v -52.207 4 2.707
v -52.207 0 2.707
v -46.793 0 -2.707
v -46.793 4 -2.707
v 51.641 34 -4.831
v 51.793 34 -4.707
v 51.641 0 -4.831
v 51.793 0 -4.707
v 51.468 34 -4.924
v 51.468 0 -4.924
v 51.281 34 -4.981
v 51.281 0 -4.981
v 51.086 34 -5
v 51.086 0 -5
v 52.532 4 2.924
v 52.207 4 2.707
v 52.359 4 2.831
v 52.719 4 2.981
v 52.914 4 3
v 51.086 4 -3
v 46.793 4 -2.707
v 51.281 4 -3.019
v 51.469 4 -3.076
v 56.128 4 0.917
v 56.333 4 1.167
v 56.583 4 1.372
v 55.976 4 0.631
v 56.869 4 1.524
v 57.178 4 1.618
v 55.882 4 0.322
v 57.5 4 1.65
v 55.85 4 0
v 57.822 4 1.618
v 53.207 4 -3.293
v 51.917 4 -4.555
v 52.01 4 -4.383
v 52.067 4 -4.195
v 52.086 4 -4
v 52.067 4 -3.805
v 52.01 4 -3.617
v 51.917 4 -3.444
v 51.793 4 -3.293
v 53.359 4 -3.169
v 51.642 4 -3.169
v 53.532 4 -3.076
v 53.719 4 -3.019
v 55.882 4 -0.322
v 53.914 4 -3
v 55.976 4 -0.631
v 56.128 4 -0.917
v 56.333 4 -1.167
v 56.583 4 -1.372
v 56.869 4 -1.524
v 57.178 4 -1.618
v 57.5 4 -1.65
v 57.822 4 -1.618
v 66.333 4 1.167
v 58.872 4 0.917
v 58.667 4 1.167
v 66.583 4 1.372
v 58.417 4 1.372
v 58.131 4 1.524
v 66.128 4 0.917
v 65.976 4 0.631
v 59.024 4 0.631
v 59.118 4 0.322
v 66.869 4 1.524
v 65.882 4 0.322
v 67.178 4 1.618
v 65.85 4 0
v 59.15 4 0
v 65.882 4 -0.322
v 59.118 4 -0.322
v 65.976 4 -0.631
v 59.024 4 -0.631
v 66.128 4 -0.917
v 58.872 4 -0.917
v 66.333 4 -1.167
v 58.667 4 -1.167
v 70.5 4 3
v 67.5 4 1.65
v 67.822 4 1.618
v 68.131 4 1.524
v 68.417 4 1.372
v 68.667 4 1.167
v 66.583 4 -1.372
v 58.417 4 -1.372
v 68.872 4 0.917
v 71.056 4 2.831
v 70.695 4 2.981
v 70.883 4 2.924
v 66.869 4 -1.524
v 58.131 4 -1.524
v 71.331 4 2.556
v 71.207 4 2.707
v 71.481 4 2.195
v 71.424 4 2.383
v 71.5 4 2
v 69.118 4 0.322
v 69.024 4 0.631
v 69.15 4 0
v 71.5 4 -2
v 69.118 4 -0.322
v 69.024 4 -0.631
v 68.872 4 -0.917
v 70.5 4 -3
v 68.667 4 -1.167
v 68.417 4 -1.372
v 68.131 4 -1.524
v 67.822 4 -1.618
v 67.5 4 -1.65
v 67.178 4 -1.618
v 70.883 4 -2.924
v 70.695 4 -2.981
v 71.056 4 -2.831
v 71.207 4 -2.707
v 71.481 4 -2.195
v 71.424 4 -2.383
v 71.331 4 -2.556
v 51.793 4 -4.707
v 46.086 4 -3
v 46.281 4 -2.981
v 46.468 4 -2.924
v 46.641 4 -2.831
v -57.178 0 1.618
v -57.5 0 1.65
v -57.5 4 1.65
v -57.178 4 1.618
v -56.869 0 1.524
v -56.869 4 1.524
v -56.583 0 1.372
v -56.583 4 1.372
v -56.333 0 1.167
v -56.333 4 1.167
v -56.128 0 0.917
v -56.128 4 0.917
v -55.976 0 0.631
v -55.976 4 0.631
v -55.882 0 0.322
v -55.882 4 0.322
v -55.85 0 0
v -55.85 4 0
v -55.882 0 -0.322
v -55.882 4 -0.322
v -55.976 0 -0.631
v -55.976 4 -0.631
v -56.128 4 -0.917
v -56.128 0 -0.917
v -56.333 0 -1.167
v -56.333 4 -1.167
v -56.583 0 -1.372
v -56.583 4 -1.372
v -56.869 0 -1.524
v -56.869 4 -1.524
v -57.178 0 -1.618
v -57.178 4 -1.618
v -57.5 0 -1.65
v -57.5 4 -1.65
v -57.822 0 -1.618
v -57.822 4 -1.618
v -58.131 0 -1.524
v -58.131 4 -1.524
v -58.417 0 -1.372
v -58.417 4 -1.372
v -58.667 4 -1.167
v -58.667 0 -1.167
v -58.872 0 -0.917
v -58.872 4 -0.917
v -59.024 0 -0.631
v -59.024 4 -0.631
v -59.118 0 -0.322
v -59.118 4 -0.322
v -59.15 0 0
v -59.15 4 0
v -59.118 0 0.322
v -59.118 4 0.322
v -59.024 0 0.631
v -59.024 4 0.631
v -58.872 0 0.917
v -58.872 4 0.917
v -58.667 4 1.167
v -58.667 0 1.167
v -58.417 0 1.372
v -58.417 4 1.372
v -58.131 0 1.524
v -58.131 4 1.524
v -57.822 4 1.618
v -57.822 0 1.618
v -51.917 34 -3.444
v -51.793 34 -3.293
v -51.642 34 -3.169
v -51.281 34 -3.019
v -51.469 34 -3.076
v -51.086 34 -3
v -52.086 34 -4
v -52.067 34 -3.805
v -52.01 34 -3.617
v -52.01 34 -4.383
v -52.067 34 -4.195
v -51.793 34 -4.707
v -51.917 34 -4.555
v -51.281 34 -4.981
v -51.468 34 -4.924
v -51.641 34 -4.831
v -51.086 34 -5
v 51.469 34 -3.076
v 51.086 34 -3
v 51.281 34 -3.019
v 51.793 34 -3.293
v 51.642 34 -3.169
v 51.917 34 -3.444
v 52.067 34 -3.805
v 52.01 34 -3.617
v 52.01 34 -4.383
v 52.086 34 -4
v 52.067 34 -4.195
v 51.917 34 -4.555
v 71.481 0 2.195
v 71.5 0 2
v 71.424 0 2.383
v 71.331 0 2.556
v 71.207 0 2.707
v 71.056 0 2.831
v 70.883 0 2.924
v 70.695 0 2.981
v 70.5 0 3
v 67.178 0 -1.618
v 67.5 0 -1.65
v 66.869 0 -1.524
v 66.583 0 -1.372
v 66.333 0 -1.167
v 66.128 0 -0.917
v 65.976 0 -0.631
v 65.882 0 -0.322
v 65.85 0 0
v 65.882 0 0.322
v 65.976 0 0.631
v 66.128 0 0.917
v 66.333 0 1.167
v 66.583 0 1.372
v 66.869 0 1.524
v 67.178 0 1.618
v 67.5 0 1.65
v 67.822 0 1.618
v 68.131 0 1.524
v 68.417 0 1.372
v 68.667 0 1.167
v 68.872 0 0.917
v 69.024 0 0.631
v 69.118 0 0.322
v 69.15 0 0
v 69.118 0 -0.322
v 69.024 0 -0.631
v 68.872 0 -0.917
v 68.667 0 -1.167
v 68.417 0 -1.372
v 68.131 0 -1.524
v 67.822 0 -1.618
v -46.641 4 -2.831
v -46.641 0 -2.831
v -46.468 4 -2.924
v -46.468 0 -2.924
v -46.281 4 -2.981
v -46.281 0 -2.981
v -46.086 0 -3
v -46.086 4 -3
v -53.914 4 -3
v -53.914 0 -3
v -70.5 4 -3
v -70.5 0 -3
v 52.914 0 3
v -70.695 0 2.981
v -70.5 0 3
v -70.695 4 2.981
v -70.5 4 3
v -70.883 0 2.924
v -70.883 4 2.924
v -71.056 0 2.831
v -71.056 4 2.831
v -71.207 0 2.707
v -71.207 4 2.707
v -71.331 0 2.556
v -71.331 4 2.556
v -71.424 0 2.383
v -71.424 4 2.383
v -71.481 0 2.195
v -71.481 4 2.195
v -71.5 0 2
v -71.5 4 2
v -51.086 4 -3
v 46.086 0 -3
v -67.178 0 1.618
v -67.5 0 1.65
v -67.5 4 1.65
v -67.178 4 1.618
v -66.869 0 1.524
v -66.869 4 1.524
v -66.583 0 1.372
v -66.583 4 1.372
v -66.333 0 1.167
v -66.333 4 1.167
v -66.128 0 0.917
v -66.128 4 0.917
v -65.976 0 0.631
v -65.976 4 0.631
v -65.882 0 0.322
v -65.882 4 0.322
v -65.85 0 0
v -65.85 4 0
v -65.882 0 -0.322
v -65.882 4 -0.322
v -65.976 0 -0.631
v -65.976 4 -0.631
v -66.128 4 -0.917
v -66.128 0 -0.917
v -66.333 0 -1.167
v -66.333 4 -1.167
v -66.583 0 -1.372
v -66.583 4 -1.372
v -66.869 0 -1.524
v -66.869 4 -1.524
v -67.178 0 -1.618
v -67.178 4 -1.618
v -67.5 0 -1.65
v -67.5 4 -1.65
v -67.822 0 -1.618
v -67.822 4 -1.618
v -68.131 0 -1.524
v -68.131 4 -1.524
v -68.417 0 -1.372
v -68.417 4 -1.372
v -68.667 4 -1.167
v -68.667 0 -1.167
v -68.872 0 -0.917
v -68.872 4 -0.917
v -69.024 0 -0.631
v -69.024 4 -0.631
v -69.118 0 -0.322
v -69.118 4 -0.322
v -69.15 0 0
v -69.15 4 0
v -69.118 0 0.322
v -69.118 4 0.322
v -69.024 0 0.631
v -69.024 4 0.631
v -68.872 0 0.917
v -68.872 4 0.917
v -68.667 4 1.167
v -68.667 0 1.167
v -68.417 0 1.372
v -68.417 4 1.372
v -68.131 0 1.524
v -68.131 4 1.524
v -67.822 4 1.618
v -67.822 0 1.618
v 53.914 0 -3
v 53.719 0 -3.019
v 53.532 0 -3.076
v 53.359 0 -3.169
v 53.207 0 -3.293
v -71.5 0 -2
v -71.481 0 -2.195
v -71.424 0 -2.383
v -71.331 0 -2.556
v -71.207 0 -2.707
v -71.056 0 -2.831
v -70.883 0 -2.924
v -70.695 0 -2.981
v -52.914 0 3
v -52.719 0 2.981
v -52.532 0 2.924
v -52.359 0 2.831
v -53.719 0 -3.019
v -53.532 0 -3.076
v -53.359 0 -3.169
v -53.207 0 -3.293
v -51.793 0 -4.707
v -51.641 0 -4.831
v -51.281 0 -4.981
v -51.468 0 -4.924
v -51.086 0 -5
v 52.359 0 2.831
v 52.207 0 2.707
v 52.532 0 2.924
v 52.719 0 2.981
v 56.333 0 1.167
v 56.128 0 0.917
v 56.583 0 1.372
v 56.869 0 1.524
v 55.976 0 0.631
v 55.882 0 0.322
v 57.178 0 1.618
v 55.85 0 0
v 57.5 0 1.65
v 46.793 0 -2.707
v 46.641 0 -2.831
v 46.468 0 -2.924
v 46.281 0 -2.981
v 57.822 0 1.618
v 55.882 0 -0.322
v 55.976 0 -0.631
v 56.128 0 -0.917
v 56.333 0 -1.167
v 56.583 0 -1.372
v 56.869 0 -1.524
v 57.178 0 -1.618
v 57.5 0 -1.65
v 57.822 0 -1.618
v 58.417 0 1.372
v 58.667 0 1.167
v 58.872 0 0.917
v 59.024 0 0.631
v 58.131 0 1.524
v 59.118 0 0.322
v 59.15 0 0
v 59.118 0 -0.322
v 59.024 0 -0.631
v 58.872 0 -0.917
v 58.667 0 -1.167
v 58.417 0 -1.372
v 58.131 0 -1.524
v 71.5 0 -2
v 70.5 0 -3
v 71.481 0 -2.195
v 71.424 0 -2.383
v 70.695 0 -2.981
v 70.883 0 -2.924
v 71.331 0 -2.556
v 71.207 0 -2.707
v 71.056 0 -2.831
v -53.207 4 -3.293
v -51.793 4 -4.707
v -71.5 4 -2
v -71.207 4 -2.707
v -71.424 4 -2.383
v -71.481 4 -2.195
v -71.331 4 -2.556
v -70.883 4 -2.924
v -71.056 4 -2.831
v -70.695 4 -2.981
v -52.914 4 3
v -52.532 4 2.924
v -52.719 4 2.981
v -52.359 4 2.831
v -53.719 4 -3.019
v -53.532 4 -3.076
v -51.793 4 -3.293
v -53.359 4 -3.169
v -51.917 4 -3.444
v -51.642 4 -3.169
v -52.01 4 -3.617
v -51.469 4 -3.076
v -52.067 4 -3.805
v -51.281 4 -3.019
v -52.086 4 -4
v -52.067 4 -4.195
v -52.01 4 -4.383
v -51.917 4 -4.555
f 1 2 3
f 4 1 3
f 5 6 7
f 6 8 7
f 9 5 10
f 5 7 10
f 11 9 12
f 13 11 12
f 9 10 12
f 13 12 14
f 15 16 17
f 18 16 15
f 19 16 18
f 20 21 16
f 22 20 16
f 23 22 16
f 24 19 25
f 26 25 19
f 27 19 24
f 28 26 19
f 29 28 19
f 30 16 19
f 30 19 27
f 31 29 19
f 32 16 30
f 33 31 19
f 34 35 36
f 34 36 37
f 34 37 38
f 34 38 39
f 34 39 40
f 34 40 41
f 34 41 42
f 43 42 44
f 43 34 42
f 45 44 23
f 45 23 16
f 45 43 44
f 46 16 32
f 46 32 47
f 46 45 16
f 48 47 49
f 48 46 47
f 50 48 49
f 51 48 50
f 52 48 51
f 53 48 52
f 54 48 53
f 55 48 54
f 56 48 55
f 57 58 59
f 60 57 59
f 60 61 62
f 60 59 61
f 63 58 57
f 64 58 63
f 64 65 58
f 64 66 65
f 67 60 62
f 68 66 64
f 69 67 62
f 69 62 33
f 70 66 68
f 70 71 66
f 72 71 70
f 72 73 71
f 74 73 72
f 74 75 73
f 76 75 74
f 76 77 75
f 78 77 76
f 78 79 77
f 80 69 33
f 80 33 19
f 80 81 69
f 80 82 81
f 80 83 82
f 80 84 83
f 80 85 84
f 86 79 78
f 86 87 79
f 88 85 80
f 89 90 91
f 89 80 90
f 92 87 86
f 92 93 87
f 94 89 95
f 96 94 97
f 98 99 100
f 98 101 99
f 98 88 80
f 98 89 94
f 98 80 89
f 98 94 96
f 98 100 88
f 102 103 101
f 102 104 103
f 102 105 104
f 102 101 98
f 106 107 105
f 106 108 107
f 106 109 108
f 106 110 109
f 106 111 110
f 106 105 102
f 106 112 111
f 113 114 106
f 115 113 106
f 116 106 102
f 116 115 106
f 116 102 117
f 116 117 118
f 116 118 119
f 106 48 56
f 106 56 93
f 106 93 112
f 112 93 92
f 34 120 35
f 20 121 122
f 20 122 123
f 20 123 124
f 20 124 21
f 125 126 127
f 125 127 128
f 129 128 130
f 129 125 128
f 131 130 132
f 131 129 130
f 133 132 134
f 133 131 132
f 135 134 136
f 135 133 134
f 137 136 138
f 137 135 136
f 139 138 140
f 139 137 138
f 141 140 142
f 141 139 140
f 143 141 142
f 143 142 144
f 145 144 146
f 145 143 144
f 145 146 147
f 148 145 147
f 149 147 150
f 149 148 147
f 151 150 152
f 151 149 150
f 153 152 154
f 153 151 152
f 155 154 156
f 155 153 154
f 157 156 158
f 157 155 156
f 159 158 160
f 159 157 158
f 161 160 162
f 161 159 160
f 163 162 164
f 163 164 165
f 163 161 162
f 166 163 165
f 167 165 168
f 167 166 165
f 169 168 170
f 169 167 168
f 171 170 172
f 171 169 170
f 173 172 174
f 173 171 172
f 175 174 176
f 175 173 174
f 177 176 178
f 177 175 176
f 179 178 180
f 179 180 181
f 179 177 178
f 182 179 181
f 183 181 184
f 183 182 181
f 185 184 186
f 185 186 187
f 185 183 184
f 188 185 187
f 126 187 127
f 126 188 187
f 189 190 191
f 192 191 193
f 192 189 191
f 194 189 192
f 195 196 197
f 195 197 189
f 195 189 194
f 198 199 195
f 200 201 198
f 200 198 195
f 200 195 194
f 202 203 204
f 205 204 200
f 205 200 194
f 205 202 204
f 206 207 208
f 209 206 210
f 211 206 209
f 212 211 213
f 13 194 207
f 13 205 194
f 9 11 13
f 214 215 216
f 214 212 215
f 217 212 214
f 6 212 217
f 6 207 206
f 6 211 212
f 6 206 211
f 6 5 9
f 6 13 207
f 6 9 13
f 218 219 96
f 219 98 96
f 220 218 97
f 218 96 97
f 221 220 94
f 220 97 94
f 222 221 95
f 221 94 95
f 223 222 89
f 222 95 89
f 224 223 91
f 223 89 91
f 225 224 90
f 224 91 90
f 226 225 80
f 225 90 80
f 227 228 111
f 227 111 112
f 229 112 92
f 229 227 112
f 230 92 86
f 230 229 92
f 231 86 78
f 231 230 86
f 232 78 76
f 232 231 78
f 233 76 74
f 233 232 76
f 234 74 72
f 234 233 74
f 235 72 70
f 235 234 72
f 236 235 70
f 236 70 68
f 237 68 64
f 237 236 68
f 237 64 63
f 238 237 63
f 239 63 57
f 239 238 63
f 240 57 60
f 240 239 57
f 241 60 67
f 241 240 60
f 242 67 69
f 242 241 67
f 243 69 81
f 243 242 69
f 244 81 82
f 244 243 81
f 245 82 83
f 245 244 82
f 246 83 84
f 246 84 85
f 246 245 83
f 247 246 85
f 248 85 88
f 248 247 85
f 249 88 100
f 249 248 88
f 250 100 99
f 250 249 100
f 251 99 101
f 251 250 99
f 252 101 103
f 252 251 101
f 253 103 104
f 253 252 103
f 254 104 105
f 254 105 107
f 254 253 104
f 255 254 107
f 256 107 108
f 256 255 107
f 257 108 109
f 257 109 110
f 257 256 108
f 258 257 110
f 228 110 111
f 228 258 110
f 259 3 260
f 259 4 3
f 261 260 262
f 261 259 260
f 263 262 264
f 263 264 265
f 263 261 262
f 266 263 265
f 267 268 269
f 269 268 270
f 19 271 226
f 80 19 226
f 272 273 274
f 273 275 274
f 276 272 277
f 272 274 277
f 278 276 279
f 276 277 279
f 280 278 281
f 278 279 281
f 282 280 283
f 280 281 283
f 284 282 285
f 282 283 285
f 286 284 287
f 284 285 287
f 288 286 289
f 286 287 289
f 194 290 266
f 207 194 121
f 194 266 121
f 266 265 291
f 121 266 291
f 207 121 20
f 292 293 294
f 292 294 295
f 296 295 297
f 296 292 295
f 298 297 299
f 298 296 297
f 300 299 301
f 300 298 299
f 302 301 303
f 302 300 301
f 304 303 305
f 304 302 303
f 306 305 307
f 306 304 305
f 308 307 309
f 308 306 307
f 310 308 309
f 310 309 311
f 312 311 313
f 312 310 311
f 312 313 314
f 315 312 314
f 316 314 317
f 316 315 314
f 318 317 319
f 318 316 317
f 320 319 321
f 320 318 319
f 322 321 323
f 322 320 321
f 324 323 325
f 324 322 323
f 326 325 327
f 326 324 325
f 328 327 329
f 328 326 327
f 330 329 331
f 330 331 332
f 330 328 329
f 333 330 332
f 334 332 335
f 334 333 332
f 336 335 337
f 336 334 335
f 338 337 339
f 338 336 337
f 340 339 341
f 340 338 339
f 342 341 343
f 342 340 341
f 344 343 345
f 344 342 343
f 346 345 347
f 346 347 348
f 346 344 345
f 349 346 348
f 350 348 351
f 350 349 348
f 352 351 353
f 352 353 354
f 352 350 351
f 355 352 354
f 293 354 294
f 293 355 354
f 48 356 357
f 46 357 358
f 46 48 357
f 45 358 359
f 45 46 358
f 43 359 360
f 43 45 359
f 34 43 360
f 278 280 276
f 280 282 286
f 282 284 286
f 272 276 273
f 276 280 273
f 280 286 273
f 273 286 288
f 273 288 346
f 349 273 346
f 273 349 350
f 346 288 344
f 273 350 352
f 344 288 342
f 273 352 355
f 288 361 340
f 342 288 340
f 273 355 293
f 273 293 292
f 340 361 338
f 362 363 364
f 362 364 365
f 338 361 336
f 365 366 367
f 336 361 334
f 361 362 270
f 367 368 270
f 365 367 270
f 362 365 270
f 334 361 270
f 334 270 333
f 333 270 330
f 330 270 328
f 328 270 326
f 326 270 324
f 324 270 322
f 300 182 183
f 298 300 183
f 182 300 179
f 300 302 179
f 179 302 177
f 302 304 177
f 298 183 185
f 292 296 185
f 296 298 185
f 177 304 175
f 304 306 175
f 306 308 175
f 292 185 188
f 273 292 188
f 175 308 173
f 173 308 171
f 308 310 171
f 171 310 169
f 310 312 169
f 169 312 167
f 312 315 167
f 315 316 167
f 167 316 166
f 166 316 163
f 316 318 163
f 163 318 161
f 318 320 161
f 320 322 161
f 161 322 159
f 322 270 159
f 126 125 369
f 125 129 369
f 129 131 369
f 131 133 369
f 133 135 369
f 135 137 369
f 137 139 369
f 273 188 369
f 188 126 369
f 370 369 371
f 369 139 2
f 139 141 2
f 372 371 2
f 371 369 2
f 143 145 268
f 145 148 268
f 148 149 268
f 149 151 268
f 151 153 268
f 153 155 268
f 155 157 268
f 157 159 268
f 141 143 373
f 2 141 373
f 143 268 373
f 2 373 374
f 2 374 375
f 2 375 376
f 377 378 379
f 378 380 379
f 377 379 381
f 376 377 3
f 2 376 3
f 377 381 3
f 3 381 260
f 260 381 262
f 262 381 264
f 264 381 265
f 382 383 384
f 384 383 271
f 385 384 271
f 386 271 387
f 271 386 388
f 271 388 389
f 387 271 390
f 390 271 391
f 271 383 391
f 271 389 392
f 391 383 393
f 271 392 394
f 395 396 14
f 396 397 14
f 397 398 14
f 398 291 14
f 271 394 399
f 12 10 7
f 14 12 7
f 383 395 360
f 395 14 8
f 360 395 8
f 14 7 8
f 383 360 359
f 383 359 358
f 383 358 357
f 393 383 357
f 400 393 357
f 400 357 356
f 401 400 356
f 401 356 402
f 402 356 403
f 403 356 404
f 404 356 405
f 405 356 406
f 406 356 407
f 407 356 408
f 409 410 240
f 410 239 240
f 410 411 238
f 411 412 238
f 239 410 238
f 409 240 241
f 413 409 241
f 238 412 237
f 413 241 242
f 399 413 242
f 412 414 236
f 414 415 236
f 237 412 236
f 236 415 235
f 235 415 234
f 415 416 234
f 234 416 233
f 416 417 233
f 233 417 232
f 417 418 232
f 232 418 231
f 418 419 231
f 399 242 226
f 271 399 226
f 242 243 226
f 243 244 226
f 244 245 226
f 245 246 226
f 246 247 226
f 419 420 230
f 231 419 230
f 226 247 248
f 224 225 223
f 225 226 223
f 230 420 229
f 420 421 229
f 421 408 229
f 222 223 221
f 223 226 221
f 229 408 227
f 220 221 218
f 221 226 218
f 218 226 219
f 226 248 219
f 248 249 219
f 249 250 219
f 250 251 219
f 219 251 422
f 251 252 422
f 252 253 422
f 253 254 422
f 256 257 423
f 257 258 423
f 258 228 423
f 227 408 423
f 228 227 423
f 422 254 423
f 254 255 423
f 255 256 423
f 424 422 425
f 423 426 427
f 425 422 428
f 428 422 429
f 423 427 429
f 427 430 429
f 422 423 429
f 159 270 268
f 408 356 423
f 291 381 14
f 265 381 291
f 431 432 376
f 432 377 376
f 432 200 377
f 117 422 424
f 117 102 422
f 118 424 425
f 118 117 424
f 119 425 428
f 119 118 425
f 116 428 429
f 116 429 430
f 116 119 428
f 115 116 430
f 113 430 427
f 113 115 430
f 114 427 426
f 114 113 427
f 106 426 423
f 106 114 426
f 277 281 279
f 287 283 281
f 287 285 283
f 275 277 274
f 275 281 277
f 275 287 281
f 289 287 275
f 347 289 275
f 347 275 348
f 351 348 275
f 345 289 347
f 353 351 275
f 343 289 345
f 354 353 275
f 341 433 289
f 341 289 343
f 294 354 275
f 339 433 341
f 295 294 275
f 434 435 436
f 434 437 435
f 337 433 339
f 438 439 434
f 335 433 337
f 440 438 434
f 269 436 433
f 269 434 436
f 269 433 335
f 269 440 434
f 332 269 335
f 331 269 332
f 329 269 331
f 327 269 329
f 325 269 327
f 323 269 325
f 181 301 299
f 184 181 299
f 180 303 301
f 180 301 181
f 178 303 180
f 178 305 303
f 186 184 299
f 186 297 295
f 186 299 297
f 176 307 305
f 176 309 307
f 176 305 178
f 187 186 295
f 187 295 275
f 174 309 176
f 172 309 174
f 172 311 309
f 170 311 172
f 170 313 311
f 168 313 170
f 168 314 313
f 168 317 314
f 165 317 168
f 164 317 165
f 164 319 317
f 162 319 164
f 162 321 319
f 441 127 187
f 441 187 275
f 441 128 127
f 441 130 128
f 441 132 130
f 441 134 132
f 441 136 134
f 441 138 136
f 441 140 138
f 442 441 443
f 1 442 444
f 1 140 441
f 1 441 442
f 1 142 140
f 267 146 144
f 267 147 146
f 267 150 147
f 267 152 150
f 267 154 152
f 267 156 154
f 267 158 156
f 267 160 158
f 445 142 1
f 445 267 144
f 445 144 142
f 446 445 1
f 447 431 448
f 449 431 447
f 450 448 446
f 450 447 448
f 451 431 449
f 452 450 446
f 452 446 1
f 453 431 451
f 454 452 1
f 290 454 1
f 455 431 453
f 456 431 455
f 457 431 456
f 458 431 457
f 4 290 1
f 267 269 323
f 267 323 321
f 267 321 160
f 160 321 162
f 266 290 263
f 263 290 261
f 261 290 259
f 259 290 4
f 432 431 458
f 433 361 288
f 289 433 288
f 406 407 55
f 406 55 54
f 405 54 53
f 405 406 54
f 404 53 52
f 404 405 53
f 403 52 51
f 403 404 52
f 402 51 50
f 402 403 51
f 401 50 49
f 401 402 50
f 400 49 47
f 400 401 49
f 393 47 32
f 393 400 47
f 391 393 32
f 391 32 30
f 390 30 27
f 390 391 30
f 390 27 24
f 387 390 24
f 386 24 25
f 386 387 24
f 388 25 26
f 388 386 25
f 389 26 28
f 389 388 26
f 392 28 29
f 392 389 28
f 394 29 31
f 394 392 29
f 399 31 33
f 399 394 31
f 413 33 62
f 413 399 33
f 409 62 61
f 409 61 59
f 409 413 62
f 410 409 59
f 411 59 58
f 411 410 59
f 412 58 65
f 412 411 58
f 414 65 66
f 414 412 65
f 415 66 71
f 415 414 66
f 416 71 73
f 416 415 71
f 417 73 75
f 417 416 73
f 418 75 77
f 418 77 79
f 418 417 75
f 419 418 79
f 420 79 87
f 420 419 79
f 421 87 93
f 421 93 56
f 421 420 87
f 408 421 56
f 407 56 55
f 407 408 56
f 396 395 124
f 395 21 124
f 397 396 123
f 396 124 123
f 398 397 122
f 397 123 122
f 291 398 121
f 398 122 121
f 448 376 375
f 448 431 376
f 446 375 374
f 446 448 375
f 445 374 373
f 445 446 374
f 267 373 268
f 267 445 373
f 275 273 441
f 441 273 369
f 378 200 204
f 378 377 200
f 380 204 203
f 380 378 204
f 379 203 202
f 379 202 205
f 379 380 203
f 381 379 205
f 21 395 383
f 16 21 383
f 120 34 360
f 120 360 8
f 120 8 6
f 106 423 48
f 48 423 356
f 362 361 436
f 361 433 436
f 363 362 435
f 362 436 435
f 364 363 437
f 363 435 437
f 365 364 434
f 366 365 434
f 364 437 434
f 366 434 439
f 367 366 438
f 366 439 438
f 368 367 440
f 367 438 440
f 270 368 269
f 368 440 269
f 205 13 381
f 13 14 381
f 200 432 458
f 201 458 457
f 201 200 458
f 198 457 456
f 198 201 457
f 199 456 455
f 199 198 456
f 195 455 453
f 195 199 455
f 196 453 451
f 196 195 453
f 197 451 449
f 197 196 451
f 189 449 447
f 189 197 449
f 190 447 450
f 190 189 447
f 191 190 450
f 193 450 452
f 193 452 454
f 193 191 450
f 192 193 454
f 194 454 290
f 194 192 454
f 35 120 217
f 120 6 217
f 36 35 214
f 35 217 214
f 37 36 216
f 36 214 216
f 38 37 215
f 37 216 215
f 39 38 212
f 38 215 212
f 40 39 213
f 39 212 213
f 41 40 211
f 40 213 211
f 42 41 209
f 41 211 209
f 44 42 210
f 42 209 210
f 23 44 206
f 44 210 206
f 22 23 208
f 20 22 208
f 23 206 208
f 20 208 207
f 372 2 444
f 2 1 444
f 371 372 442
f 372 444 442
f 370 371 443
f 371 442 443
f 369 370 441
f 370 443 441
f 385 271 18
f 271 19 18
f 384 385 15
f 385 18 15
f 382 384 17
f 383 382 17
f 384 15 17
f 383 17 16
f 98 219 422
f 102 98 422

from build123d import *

# Parameters (mm, degrees)
SKETCH_1_R      = 1.65
EXTRUDE_1_DEPTH = 4
EXTRUDE_2_DEPTH = 30
FILLET_1_R      = 1
FILLET_2_R      = 1


with BuildPart() as part:
    # 草图1 → 凸台-拉伸1 (new body)
    with BuildSketch(Plane(origin=(0, 0, 0), x_dir=(1, 0, 0), z_dir=(0, 1, 0))):
        Polygon((-71.5, 3), (-71.5, -3), (-52.5, -3), (-46.5, 3), (46.5, 3), (52.5, -3), (71.5, -3), (71.5, 3), (53.5, 3), (51.5, 5), (-51.5, 5), (-53.5, 3), align=None)
        with Locations(Location((-57.5, 0, 0), (0, 0, 270))):
            Circle(SKETCH_1_R, mode=Mode.SUBTRACT)
        with Locations(Location((-67.5, 0, 0), (0, 0, 270))):
            Circle(SKETCH_1_R, mode=Mode.SUBTRACT)
        with Locations(Location((67.5, 0, 0), (0, 0, 90))):
            Circle(SKETCH_1_R, mode=Mode.SUBTRACT)
        with Locations(Location((57.5, 0, 0), (0, 0, 90))):
            Circle(SKETCH_1_R, mode=Mode.SUBTRACT)
    extrude(amount=EXTRUDE_1_DEPTH)

    # 草图2 → 凸台-拉伸2 (add)
    with BuildSketch(Plane(origin=(0, 4, 0), x_dir=(1, 0, 0), z_dir=(0, 1, 0))):
        Polygon((-51.5, 5), (-53.5, 3), (53.5, 3), (51.5, 5), align=None)
    extrude(amount=EXTRUDE_2_DEPTH)

    # 圆角1
    fillet_1_edges = [part.edges().sort_by_distance(p)[0] for p in [
        (51.5, 17, -5),
        (-51.5, 17, -5),
        (-71.5, 2, -3),
        (-71.5, 2, 3),
        (-46.5, 2, -3),
        (46.5, 2, -3),
        (52.5, 2, 3),
        (71.5, 2, 3),
        (71.5, 2, -3),
        (-52.5, 2, 3),
        (-53.5, 19, -3),
        (53.5, 19, -3),
    ]]
    fillet(fillet_1_edges, radius=FILLET_1_R - 0.0001)  # a hair under: the kernel refuses the full size

    # 圆角2
    fillet_2_edges = [part.edges().sort_by_distance(p)[0] for p in [
        (53.5, 2, -3),
        (-53.5, 2, -3),
    ]]
    fillet(fillet_2_edges, radius=FILLET_2_R)


solid = part.part
